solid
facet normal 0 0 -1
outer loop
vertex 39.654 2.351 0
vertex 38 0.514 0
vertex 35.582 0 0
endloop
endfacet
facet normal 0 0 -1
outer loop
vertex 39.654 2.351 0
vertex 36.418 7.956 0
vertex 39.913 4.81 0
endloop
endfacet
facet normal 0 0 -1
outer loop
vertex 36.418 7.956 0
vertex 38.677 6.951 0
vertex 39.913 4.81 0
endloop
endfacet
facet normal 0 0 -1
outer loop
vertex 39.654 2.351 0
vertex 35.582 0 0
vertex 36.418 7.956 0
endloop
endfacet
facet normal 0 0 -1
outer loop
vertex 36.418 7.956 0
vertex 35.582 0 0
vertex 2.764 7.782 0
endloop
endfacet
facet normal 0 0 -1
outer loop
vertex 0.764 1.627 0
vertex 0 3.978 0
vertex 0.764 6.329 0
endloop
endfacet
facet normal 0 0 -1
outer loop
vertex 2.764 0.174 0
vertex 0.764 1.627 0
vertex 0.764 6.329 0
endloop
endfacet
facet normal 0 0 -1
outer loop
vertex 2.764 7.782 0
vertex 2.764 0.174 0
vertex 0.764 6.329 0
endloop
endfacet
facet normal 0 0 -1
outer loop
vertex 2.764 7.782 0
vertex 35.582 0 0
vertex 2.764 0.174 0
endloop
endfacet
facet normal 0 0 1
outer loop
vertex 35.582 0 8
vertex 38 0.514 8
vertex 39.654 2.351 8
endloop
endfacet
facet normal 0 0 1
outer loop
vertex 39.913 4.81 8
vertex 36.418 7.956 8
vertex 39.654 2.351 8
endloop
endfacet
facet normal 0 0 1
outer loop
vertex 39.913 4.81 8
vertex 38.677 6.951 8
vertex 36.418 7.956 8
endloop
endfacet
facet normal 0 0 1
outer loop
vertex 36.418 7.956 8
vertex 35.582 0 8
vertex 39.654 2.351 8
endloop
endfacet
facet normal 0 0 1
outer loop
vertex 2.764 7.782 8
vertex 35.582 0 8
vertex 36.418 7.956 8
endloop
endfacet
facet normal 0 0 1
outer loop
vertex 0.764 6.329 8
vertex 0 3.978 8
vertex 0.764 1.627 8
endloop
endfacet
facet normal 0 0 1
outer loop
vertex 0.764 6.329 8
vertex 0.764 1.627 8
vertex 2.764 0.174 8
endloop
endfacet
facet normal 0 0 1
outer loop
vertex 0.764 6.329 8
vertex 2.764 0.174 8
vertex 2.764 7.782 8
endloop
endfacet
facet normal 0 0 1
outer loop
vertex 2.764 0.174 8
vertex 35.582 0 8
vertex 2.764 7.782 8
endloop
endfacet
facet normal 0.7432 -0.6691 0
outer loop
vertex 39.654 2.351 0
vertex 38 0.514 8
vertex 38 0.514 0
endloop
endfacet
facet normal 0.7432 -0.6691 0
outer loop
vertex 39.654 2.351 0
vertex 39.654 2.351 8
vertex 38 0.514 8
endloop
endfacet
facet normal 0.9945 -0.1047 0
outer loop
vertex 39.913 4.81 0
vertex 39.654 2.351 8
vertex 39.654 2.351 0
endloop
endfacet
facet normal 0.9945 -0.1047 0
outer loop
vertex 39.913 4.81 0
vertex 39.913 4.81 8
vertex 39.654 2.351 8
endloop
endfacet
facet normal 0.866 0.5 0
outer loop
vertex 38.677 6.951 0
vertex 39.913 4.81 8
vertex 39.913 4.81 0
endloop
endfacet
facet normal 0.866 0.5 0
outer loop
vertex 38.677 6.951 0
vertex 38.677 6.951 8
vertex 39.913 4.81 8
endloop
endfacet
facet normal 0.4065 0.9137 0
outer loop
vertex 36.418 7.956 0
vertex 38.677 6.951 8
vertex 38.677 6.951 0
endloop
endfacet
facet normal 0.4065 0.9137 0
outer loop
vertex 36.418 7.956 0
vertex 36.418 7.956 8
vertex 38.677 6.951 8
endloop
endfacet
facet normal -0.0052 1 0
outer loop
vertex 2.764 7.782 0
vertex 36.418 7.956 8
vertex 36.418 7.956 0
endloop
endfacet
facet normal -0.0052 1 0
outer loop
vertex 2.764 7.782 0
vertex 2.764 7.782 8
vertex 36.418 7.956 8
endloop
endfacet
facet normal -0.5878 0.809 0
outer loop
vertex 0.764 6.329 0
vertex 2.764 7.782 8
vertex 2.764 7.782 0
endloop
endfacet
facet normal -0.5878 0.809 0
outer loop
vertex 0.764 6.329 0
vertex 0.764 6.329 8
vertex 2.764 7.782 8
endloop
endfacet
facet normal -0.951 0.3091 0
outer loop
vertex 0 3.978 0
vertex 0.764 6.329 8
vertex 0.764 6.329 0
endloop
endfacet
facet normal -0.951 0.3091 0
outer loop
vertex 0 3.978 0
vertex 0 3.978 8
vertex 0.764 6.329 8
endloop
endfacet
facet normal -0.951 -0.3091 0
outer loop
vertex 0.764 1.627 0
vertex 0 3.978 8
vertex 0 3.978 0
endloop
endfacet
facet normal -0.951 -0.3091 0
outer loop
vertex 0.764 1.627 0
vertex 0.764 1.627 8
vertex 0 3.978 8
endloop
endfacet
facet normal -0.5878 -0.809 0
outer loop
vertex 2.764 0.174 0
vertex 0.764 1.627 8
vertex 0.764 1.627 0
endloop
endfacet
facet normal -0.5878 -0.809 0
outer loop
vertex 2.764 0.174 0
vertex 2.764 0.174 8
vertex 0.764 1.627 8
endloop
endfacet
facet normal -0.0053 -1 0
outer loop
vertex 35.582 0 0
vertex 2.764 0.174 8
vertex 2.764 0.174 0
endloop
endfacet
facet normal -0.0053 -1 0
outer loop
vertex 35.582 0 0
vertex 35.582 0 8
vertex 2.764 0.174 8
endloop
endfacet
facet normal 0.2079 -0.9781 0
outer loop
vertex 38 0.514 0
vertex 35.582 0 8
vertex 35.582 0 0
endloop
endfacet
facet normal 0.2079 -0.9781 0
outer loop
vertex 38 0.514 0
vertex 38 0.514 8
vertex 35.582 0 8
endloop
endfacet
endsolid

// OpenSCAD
$fn = 32;

// ----------------------------------------------------------------------
// Key bar: parallel key, 8 mm thick
// ----------------------------------------------------------------------

// --- parameters (mm) ---
profile_height = 8;       // extrusion height
profile_points = 11;      // points of the closed outline

profile = [[0, 3.978], [0.764, 1.627], [2.764, 0.174], [35.582, 0], [38, 0.514], [39.654, 2.351], [39.913, 4.81], [38.677, 6.951], [36.418, 7.956], [2.764, 7.782], [0.764, 6.329]];  // single closed polygon, 11 points, counter clockwise

// --- the one profile operation ---
linear_extrude(height = profile_height) polygon(points = profile);
